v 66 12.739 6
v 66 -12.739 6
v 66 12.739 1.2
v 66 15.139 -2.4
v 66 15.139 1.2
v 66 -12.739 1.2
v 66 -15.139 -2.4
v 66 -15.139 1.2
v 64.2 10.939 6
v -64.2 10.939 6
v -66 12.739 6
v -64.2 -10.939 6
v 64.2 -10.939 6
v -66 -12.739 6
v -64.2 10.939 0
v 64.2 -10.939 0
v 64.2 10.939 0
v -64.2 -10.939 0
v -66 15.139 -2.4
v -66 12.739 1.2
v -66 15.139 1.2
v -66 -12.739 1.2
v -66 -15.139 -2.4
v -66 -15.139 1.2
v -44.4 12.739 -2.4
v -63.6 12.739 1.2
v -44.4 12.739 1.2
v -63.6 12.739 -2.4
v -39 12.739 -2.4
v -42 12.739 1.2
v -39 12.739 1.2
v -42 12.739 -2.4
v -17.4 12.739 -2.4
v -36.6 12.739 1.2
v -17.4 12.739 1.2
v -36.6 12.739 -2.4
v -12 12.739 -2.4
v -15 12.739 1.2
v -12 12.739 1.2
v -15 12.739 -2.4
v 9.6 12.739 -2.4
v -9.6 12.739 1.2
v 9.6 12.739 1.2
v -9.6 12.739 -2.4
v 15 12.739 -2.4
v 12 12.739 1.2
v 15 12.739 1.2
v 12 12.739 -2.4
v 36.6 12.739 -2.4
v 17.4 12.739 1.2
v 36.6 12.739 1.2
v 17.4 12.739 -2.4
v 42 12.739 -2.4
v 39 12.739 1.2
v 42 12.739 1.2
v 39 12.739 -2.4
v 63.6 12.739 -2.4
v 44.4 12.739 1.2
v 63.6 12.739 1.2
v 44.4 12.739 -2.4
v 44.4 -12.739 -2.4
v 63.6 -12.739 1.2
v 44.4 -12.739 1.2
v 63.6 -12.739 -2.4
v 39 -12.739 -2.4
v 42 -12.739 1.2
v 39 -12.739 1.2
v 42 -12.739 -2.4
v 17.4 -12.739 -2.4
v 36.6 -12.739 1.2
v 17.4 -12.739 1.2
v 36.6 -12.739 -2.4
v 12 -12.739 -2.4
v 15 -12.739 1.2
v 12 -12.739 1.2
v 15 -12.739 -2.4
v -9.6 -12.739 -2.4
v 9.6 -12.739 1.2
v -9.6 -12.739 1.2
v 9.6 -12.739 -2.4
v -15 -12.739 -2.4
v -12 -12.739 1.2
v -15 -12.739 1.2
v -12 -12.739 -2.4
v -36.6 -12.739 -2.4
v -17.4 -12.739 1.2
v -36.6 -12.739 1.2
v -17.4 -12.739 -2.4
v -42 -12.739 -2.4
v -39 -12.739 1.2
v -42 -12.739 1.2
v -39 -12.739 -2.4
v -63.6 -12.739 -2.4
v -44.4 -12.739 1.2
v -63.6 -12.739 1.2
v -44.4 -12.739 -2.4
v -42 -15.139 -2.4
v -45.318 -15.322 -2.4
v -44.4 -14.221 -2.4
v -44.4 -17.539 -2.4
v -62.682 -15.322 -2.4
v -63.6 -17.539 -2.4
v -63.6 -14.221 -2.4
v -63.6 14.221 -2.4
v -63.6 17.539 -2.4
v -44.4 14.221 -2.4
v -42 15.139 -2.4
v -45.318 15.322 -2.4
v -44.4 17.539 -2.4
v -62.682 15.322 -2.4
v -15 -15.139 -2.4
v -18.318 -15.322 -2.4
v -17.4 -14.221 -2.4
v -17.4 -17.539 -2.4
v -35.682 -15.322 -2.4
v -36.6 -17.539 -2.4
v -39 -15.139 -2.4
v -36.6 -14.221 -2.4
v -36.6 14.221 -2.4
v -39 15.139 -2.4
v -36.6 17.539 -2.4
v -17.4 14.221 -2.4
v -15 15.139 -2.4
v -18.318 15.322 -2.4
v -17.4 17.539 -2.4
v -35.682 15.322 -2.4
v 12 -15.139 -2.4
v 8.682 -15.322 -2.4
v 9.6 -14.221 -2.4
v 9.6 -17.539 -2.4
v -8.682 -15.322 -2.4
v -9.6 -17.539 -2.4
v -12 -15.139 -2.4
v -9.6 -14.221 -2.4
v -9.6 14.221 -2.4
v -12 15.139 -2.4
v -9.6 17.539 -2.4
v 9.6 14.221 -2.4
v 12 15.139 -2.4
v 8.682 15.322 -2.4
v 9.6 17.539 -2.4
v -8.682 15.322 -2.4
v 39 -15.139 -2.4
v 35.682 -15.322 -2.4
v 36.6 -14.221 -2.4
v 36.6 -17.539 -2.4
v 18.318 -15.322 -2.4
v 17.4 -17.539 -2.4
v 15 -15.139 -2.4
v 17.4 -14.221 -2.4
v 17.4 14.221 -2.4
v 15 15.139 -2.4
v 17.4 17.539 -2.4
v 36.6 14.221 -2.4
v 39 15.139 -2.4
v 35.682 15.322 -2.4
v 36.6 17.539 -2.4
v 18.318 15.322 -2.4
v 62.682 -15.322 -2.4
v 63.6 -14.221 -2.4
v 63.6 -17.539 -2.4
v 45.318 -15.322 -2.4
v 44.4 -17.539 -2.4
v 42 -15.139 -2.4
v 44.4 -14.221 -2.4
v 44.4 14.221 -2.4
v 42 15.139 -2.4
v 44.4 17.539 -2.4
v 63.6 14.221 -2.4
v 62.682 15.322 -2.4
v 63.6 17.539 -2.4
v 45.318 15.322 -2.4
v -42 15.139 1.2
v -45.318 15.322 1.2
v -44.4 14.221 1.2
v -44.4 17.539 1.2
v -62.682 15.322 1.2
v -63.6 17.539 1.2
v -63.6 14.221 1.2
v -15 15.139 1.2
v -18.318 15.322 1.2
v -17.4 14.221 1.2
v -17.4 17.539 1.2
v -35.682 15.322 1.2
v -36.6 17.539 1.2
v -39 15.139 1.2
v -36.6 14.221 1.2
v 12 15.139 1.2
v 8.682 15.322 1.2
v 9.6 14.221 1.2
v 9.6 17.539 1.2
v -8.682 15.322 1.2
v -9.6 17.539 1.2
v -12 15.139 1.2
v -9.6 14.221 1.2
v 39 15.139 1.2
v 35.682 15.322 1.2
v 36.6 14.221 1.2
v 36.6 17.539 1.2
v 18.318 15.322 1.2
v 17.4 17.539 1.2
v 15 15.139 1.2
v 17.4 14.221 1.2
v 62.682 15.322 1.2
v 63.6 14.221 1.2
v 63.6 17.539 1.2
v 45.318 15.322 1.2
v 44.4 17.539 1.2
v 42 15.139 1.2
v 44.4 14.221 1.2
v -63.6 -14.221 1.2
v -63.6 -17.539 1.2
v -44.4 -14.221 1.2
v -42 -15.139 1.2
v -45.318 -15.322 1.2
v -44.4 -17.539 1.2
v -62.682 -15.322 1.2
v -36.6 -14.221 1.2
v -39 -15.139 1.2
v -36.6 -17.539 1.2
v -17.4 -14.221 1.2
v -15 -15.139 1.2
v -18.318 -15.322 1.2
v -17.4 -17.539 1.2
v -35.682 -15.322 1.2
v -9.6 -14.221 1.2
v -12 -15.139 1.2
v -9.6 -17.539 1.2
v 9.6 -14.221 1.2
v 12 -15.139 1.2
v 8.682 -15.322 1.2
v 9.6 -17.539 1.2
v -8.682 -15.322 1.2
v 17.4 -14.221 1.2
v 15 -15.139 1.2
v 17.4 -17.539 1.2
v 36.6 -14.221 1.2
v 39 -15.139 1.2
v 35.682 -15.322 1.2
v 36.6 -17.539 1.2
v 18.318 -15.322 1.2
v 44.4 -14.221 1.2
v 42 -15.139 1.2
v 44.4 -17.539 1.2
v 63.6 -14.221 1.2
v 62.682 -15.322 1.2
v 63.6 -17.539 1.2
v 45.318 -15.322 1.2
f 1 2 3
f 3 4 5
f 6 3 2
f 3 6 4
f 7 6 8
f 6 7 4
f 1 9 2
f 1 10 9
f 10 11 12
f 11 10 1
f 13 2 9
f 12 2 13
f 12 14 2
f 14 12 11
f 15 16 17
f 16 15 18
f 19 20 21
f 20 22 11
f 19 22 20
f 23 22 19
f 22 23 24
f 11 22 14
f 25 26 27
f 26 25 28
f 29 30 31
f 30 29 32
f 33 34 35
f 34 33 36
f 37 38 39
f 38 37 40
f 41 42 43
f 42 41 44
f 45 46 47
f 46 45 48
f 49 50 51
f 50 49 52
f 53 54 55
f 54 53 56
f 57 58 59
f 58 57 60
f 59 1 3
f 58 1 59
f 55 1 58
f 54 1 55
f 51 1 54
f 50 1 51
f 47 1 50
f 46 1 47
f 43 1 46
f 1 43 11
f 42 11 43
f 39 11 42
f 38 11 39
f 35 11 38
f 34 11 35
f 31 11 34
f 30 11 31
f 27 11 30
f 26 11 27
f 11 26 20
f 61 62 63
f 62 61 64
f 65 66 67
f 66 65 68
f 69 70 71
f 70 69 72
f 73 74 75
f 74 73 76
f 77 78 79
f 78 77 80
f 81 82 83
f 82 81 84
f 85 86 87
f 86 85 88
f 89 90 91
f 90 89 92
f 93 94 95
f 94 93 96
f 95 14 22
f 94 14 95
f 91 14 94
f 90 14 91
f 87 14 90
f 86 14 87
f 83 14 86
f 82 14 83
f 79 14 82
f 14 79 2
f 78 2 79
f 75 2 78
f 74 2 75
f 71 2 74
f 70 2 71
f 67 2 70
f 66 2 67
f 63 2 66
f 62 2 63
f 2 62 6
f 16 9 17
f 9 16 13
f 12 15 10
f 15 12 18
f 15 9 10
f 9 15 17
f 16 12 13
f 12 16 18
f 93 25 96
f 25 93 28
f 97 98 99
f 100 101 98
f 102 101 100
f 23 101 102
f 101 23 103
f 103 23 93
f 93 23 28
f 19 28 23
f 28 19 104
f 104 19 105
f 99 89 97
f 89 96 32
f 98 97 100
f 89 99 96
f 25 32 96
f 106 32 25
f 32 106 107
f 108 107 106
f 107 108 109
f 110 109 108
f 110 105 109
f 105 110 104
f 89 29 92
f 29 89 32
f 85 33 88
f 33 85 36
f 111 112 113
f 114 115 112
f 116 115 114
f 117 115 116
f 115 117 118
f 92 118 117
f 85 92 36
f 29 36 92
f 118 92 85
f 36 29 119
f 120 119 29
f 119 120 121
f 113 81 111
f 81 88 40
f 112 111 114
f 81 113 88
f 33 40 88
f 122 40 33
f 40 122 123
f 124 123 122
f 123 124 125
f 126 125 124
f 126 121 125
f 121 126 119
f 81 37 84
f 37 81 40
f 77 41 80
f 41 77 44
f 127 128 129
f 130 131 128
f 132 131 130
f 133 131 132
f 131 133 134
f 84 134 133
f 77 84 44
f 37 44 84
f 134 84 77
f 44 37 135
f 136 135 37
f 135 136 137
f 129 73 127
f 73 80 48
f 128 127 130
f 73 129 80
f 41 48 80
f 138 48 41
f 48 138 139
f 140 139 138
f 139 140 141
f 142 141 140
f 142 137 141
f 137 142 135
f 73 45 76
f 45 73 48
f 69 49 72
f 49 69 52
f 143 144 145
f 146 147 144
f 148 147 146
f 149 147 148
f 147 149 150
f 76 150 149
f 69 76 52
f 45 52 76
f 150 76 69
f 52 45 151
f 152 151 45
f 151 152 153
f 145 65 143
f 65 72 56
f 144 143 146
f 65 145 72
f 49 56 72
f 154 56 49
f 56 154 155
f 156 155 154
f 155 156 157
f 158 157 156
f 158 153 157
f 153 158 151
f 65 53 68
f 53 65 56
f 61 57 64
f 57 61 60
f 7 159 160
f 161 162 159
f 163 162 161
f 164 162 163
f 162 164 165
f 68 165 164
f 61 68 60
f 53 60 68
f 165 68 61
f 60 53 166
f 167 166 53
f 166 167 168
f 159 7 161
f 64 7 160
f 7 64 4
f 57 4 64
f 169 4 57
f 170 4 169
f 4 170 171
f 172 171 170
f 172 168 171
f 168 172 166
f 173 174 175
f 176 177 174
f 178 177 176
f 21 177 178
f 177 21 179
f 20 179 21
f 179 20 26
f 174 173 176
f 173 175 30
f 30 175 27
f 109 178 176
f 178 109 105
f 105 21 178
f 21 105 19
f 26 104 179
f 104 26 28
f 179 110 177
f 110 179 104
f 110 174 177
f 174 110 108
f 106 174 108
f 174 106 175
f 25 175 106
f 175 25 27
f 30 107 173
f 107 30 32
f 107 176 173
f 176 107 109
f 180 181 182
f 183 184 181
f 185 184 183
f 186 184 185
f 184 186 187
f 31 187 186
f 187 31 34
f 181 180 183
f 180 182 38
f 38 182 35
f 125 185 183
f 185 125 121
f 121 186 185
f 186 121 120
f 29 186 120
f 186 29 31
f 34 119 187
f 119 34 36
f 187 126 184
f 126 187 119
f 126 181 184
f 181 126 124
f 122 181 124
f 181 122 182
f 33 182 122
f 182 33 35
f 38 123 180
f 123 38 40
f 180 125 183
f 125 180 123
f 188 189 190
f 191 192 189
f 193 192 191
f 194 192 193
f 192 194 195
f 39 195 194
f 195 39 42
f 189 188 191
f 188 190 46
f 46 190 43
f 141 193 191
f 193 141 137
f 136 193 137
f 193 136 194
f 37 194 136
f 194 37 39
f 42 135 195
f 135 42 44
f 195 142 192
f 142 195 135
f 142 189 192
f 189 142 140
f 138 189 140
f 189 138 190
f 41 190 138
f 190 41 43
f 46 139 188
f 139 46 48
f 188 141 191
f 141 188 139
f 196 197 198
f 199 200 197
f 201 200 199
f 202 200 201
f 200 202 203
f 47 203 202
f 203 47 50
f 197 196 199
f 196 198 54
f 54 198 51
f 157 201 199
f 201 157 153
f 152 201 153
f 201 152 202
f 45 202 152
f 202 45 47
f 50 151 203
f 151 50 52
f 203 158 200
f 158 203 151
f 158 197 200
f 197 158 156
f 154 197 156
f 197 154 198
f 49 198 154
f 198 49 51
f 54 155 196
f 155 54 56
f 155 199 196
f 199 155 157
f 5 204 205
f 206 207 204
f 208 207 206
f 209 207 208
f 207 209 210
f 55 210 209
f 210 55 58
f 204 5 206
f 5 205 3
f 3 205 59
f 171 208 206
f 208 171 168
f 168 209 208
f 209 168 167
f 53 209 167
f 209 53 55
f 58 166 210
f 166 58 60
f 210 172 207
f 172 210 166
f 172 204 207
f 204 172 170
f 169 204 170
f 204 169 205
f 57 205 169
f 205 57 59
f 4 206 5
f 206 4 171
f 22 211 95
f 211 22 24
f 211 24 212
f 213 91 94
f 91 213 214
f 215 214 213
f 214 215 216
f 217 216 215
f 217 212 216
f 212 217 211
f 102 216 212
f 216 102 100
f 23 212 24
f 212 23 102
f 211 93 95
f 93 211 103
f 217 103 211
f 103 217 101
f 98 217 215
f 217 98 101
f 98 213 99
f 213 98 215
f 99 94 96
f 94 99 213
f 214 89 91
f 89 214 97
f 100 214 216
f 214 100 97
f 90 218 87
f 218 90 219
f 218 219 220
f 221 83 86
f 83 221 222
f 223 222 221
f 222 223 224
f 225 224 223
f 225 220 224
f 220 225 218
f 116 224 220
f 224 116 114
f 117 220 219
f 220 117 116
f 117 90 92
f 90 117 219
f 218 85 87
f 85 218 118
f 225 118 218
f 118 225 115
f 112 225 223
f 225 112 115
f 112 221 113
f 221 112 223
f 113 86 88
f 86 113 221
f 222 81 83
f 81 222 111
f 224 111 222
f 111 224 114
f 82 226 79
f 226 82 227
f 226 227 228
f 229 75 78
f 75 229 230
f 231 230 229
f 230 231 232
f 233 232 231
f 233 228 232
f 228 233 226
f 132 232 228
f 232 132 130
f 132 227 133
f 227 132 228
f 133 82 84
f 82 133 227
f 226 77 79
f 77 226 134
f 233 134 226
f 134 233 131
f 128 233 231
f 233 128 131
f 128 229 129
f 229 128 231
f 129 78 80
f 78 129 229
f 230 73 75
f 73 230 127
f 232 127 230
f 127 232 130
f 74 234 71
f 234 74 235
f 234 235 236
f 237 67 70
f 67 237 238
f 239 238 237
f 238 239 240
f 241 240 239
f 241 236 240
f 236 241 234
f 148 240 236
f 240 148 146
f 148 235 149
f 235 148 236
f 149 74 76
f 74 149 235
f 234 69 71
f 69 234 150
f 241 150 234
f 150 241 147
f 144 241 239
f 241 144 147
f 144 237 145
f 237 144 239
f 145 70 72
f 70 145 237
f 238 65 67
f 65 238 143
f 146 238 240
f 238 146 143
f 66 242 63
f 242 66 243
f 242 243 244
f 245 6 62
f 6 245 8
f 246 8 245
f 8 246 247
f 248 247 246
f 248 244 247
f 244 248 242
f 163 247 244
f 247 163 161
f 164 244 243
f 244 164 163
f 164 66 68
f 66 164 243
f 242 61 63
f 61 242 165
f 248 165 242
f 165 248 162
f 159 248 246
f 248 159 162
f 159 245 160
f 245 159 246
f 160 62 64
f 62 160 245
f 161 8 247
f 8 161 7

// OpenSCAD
// file: ../src/util.scad
//Данная функция корректно смещает slc_ear и sqr_ear 
//под нужный радиус окружности.
module radiused(radius,offset) {
    ystate = sqrt(radius*radius - offset*offset);
    translate([0,ystate,0]) children(0);
}

module linear_array(length, total) {
    for(x = [0:length/(total - 1):length])
        translate([x,0,0]) children(0);
}

module mirror_copy(vector) {
    union() {
        mirror(vector) children(0);
        children(0);
    }
}
// file: ../src/ear.scad
include <util.scad>

//Угловатое квадратное ухо.
//"w" - толщина уха
module sqr_ear(y,x,w,h) {
    translate([-y/2,0,0])
    difference() {
        cube([y,x,h]);
        translate([w,0,0]) cube([y-w*2,x-w,h]);
    }
}

//Ухо со сглаженными углами.
//"y" - должен быть больше чем "x".
//"w" - толщина уха
module slc_ear(y,x,w,h){
    rotate([0,0,90])
    translate([0,-y/2,0])
    linear_extrude(height=h)
    polygon([
    [0,0],
    [x/2,0],
    [x,x/2],
    [x,y-x/2],
    [x/2,y],
    [0,y],
    [0,y - w],
    [x/2 - w * sin(45/2),y - w],
    [x - w * sin(45/2*3),y -x/2 - w * cos(45/2*3)],
    [x - w * sin(45/2*3),x/2 + w * cos(45/2*3)],
    [x/2 - w * sin(45/2),w],
    [0,w],
    ]);       
}

//Ухо в виде ободка.
module rim_ears(er,ir,iir,w,h,n) {
    union() {
        difference() {
            cylinder(r=er, h=h);
            translate([0,0,-0.005])cylinder(r=ir, h=h+0.01*h);
        }
        difference() {
            for(fi = [0 : 360/n : 359]) 
            rotate([0,0,fi])
            translate([0,-w/2,0])cube([ir,w,h]);
            translate([0,0,-0.005])cylinder(r=iir,h=h+0.01*h);
        }
    }
}

//Инверсная болванка для выреза "скрытого уха".
module hide_ear(earSz) {
    translate([-2*earSz,earSz/2,0])
    rotate([90,0,0])
    linear_extrude(height = earSz)
    polygon([
    [0,-0.01*earSz],
    [earSz,-0.01*earSz],
    [2*earSz+0.01*earSz,earSz],
    [2*earSz+0.01*earSz,2*earSz],
    ]);  
}

//Демонстрационный код:
//  Массив sqr_ear.
/*for(fi = [0 : 60 : 359]) 
    rotate([0,0,fi])
    radiused(30,10) sqr_ear(10,6,2,3);*/
//linear_array(100,4) sqr_ear(10,6,2,3);

//  Массив slc_ear.
/*for(fi = [0 : 60 : 359]) 
    rotate([0,0,fi])
    radiused(30,10) slc_ear(10,6,2,3);*/

//  Круговое ухо (rim_ears).
//rim_ears(40,35,30,4,3,8);

//  Под вырезы в модели (hide_ear).
//for(fi = [0 : 360/6 : 359])
//   rotate([0,0,fi])
//   translate([30,0,0])hide_ear(2);
// file: ../src/navalniy2018.scad
//Размеры исходника(Константы)
navalniy2018_X_SIZE = 552;
navalniy2018_Y_SIZE = 62;
navalniy2018_X_TO_Y = 62 / 552;


//Данный модуль строит надпись "Навальный 2018" (image/symbol.png)
//x,y,z - размеры по осям x,y,z (
//z вычисляется по карте уровней, поэтому реальный z меньше заявленного.
//) 
//s - пустое пространство вокруг надписи.
//bh - высота базы.
module navalniy2018(x,y,z,s,bh) {
    file = "../image/navalniy2.png";
    xsize = navalniy2018_X_SIZE;
    ysize = navalniy2018_Y_SIZE;
    
    //
    union() {
        scale([1/xsize*x,1/ysize*y,1/100*z])
            translate([0,0,100])
                surface(file=file, invert=true,center=true);
    
    translate([0,0,-bh/2])cube([x + s, y + s, bh], center=true);
        
    }
   // linear_extrude(height = z, center = true, convexity = 10)
   //import (file = symbol_file);
}
    
//Демонстрационный код.
//navalniy2018(150, 150 * navalniy2018_X_TO_Y, 10, 10, 10);
// main file
include<../src/navalniy2018.scad>
include<../src/ear.scad>
include<../src/util.scad>

s = 10;
xf = 100;
yf = xf * navalniy2018_X_TO_Y;
zf = 6;
bh = 2;

earLength = 20;

rimHeight=5;
rimWidth = 3;

scale(1.2)
union() {
    //Создаём надпись.
    navalniy2018(xf,yf,zf,s,bh);
    
    //Создаём рамку.
    translate([0,0,rimHeight/2])
        difference(){
            cube([xf+s,yf+s,rimHeight], center=true);
            cube([xf+s-rimWidth,yf+s-rimWidth,rimHeight + 0.01], center=true);
        }
        
    //Создаём ушки.
    mirror_copy([0,1,0])
       translate([-(xf+s-earLength)/2,0,0])    
           for(k = [0 : (xf+s-earLength) / 4 : xf+s-earLength])
               translate([k,(yf+s)/2,-(bh)])    
                   slc_ear(earLength,4,2,3);
}
